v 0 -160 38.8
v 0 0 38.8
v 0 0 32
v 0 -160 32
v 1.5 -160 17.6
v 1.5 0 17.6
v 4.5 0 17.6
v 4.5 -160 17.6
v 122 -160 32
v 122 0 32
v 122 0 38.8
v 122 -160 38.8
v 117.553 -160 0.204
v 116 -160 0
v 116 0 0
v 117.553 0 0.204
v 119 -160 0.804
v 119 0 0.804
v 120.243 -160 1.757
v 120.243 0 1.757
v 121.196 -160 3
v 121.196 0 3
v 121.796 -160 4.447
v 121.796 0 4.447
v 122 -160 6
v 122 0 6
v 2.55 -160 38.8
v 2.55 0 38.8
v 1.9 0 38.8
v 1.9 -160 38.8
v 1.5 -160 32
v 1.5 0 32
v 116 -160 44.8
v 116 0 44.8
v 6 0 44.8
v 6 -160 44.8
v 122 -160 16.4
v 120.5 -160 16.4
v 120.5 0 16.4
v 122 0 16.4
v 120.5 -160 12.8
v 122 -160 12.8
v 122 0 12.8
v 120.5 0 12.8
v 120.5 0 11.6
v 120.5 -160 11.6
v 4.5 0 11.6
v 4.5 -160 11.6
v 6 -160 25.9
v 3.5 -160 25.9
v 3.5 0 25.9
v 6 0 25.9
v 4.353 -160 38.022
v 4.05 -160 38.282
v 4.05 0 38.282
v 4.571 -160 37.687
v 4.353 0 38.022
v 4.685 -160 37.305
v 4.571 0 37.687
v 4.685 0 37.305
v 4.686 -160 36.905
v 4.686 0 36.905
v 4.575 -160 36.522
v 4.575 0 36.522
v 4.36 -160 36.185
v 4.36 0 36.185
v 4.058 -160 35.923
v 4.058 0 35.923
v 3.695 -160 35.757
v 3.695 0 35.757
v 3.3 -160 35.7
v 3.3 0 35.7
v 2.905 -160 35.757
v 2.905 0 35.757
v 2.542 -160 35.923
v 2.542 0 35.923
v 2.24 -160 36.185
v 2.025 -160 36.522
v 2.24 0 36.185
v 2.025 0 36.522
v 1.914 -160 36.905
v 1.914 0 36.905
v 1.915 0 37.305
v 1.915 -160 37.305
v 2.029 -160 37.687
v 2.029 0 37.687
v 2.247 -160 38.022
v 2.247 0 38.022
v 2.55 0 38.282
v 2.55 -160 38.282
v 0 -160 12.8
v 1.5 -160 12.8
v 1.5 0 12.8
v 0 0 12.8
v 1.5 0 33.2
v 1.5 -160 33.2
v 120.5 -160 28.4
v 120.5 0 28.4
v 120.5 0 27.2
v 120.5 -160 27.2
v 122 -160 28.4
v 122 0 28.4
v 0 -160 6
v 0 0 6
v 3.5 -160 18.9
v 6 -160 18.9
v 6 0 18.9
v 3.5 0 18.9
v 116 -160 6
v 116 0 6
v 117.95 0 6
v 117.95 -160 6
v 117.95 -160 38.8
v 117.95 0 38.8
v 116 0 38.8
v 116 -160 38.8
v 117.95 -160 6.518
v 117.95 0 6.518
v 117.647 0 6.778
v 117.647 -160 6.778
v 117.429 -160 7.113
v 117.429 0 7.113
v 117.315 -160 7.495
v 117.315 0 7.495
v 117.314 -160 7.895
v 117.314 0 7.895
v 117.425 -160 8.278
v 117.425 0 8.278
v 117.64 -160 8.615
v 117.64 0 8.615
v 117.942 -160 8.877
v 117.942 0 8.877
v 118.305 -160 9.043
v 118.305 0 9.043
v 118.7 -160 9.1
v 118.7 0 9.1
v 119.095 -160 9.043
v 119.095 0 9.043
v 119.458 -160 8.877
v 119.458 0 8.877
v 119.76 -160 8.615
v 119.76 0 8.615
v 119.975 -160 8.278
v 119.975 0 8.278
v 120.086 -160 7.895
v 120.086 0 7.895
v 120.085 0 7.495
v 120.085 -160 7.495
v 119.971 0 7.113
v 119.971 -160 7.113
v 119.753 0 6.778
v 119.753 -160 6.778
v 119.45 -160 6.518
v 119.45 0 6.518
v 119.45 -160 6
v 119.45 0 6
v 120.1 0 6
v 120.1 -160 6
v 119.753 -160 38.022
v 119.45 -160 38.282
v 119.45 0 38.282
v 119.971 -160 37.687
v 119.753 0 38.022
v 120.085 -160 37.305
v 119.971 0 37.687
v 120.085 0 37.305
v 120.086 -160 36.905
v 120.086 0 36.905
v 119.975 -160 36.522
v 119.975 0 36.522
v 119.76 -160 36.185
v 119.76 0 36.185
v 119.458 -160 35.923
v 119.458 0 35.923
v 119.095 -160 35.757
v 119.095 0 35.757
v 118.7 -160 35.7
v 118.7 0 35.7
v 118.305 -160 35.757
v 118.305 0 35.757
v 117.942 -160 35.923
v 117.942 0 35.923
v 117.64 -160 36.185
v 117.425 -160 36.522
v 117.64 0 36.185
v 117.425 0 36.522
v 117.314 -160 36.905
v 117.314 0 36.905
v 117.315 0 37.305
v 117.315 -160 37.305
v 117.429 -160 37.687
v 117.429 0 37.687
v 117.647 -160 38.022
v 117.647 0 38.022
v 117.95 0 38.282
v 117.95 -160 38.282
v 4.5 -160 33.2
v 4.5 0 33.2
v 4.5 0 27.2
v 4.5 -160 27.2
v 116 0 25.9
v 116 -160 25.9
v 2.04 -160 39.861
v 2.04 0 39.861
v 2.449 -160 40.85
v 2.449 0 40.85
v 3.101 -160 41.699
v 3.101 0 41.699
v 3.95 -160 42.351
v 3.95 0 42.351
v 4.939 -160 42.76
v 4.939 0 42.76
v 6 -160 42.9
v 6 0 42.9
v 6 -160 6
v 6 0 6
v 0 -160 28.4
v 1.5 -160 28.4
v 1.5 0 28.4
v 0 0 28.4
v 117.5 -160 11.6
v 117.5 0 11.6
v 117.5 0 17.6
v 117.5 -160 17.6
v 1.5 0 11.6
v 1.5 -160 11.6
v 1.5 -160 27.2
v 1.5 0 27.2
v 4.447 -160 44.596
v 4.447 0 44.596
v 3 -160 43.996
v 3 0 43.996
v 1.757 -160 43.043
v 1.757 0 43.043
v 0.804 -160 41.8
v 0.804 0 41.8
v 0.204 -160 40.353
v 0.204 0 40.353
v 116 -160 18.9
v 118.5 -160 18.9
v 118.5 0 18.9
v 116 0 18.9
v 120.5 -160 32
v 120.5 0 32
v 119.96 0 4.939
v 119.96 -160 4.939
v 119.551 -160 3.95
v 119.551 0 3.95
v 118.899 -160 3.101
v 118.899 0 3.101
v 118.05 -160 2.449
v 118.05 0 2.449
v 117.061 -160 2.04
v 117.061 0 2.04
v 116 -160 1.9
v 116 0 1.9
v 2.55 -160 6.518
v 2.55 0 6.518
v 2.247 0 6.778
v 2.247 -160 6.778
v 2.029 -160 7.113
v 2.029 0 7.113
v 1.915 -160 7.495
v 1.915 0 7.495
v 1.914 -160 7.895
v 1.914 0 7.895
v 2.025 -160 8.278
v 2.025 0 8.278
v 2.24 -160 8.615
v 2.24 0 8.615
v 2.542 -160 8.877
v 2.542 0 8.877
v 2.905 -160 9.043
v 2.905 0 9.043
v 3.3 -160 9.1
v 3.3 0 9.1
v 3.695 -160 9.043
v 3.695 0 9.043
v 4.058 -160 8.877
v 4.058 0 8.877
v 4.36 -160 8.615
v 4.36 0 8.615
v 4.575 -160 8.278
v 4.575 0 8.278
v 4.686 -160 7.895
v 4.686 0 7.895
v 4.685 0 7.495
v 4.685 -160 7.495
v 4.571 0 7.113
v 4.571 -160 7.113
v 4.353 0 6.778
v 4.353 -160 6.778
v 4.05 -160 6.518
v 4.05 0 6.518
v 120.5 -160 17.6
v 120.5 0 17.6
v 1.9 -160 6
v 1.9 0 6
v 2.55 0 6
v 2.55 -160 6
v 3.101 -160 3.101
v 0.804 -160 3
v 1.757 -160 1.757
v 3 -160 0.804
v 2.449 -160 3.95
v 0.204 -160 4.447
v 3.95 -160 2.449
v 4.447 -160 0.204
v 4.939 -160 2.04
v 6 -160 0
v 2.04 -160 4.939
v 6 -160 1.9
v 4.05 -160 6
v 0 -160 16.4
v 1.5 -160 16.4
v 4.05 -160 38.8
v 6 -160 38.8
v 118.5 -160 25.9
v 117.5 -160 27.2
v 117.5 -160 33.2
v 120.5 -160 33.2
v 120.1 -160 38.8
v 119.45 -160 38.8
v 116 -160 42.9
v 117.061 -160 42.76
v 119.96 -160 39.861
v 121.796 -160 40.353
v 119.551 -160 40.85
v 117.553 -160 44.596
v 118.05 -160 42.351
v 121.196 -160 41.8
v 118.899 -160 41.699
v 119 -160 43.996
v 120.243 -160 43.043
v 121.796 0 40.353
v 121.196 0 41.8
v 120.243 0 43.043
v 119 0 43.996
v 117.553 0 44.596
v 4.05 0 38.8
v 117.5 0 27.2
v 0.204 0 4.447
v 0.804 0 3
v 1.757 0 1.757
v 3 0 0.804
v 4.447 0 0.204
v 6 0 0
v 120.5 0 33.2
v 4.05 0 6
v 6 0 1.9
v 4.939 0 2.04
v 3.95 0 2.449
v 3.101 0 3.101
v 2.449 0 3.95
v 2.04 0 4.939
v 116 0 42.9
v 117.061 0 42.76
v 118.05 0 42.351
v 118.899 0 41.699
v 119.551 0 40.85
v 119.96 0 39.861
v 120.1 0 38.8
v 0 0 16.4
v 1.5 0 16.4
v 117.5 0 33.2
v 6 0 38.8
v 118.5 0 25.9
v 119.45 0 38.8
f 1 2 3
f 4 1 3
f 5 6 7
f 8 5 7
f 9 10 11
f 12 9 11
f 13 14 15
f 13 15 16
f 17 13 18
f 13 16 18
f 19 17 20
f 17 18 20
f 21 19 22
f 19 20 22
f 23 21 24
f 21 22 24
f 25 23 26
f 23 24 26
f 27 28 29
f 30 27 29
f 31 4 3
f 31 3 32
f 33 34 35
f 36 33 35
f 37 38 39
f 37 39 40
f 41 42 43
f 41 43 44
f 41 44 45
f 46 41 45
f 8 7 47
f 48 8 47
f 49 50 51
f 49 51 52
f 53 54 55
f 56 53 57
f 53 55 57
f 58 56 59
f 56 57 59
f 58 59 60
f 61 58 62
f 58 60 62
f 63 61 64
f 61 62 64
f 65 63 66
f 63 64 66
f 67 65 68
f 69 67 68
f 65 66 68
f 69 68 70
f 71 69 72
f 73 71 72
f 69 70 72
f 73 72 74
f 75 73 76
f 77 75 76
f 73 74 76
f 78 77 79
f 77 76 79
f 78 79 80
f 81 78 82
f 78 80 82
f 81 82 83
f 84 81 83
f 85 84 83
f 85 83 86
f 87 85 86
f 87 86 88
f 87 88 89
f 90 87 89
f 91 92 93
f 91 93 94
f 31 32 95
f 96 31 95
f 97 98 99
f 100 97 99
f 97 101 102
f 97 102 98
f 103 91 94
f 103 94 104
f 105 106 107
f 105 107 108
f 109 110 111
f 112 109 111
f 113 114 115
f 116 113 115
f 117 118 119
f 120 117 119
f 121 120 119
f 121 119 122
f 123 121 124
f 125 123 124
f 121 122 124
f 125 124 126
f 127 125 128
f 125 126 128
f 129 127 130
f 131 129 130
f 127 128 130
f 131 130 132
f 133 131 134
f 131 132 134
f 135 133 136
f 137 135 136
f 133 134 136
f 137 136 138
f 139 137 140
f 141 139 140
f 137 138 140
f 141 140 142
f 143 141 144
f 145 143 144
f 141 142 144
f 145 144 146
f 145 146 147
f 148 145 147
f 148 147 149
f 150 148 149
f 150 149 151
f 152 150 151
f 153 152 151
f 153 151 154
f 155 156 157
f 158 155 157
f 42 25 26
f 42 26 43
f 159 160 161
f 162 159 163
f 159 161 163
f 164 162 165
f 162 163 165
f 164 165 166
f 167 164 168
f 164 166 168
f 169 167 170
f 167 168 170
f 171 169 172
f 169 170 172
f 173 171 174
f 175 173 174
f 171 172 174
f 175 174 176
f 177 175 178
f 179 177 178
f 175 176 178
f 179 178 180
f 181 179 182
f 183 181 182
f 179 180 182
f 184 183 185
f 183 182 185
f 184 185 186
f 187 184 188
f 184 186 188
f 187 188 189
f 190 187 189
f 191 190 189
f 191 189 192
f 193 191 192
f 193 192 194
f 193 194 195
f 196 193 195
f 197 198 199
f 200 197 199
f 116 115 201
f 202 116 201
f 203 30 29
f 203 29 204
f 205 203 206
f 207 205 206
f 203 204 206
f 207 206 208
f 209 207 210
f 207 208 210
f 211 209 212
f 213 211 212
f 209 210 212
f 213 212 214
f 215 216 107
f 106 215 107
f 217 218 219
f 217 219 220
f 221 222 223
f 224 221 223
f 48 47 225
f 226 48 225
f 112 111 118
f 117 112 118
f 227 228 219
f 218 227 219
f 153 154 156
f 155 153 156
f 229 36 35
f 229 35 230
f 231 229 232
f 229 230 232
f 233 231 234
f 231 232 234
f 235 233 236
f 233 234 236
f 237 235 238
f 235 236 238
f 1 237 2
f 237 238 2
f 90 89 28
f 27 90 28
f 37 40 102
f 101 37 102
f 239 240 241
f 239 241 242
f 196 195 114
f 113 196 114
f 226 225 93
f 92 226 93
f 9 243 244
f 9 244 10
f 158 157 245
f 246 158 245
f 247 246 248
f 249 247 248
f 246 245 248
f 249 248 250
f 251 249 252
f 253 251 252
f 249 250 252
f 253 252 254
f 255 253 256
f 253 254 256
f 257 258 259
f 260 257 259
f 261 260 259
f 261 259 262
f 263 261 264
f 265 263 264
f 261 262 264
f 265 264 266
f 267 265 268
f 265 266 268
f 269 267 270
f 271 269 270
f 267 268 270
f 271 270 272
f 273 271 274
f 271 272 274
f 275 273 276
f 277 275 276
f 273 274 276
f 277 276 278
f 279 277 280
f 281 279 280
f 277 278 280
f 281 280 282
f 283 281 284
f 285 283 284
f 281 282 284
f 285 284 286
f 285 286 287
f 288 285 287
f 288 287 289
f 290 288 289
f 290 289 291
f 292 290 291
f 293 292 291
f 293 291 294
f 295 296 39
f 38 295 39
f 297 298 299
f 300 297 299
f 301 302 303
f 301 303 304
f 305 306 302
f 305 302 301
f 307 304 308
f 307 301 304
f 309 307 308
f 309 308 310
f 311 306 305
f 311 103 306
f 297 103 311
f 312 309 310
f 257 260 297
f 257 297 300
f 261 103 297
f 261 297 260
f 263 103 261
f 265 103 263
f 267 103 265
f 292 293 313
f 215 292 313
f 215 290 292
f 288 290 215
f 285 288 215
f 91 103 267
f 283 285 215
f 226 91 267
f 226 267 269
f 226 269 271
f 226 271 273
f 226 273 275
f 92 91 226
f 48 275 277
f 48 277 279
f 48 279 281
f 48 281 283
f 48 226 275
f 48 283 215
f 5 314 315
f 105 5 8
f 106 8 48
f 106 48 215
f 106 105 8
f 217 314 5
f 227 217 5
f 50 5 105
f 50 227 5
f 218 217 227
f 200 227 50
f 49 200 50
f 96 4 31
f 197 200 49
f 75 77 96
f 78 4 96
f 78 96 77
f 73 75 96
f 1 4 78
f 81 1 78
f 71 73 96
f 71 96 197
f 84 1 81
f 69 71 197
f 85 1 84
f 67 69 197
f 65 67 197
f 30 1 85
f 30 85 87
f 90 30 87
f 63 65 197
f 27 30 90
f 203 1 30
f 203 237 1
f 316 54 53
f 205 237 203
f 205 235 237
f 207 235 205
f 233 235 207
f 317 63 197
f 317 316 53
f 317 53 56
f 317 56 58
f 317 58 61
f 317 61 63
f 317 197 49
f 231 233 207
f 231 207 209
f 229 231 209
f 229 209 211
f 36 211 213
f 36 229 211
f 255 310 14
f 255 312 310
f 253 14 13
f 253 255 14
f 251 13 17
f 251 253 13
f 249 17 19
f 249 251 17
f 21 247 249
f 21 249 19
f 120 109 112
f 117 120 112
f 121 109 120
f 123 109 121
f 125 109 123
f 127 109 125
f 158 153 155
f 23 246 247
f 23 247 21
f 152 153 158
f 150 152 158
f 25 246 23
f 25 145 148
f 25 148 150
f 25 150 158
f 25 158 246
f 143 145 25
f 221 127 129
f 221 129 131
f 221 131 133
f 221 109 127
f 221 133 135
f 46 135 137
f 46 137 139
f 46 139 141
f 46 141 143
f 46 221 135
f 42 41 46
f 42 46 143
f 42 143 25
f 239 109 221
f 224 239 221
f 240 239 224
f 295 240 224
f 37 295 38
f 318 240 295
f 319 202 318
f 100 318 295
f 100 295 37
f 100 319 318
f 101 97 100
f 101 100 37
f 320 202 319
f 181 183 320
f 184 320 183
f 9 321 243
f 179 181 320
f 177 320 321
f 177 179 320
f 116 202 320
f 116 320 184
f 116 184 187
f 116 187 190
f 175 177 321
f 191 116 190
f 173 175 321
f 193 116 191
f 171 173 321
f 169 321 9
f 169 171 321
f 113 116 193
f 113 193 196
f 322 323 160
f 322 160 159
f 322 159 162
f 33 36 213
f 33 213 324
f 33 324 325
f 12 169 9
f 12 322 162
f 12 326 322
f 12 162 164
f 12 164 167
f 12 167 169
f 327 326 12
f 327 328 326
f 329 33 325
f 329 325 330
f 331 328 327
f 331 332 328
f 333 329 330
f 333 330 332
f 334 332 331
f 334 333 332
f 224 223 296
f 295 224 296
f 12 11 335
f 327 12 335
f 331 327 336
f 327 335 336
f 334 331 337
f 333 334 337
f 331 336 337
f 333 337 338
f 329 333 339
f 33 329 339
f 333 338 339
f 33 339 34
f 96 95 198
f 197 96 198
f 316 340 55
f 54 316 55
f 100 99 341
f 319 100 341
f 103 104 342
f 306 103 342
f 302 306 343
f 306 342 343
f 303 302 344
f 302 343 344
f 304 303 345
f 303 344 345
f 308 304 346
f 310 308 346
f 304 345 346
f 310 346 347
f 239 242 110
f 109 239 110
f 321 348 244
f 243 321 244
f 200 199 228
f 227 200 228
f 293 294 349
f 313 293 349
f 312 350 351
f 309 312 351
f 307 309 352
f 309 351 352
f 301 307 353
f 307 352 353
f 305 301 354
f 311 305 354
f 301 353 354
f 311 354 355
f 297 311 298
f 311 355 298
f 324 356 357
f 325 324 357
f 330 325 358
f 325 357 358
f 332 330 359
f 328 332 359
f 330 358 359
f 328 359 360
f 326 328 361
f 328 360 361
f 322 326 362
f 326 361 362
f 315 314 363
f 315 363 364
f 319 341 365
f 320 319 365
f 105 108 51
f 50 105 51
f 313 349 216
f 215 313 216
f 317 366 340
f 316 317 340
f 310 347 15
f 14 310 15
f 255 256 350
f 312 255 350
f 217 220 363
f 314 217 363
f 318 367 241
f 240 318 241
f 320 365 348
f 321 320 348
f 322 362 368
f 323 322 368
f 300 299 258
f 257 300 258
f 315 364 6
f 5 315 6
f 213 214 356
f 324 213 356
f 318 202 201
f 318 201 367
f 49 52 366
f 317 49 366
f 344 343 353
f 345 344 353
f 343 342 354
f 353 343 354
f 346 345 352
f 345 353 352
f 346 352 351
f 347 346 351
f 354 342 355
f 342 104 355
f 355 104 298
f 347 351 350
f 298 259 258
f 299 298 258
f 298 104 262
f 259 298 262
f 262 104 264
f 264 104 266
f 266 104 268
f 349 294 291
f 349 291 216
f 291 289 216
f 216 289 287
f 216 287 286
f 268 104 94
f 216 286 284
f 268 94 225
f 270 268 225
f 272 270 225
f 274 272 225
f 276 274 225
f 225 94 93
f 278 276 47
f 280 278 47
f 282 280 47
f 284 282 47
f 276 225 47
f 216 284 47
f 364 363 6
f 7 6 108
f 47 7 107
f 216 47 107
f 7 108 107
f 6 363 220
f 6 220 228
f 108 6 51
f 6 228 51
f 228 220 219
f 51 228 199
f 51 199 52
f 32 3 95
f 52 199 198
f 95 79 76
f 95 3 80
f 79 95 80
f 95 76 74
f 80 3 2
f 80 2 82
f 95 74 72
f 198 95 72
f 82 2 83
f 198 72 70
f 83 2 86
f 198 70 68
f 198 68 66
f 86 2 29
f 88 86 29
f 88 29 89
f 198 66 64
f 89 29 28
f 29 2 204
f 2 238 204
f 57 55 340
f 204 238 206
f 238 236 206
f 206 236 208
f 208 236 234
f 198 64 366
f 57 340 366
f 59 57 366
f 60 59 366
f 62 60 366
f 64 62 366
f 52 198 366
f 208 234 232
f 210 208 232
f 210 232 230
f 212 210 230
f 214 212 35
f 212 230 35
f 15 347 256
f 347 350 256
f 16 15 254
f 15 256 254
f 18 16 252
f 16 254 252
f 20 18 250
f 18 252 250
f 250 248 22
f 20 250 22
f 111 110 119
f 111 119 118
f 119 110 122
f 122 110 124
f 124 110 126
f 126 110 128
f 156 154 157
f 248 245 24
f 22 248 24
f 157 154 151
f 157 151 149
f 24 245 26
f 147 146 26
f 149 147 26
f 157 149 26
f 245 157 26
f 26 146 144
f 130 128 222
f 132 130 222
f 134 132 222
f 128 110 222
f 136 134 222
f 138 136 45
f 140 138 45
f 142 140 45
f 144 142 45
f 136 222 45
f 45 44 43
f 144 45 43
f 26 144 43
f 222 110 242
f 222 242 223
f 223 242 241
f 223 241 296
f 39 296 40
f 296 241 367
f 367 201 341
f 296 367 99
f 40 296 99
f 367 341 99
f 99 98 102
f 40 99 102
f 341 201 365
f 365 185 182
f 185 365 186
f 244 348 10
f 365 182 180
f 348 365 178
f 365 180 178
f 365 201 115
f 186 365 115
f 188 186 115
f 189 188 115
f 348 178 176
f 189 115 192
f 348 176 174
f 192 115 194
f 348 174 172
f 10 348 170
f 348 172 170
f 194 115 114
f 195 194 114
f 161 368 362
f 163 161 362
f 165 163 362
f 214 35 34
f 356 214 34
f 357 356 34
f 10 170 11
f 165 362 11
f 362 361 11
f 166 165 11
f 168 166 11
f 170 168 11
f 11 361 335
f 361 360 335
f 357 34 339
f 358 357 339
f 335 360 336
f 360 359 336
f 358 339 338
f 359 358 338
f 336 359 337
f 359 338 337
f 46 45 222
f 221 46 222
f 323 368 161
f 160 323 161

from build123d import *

# Parameters (mm, degrees)
F1_DEPTH = 160


with BuildPart() as f1:
    # F0 (on Front) → F1 (new body)
    with BuildSketch(Plane.XZ):
        with BuildLine():
            ThreePointArc((0, 6), (1.757359, 1.757359), (6, 0))
            Line((6, 0), (61, 0))
            Line((61, 0), (116, 0))
            ThreePointArc((116, 0), (120.242641, 1.757359), (122, 6))
            Line((122, 6), (122, 12.8))
            Line((122, 12.8), (120.5, 12.8))
            Line((120.5, 12.8), (120.5, 11.6))
            Line((120.5, 11.6), (117.5, 11.6))
            Line((117.5, 11.6), (117.5, 17.6))
            Line((117.5, 17.6), (120.5, 17.6))
            Line((120.5, 17.6), (120.5, 16.4))
            Line((120.5, 16.4), (122, 16.4))
            Line((122, 16.4), (122, 22.4))
            Line((122, 22.4), (122, 28.4))
            Line((122, 28.4), (120.5, 28.4))
            Line((120.5, 28.4), (120.5, 27.2))
            Line((120.5, 27.2), (117.5, 27.2))
            Line((117.5, 27.2), (117.5, 33.2))
            Line((117.5, 33.2), (120.5, 33.2))
            Line((120.5, 33.2), (120.5, 32))
            Line((120.5, 32), (122, 32))
            Line((122, 32), (122, 38.8))
            ThreePointArc((122, 38.8), (120.242641, 43.042641), (116, 44.8))
            Line((116, 44.8), (61, 44.8))
            Line((61, 44.8), (6, 44.8))
            ThreePointArc((6, 44.8), (1.757359, 43.042641), (0, 38.8))
            Line((0, 38.8), (0, 32))
            Line((0, 32), (1.5, 32))
            Line((1.5, 32), (1.5, 33.2))
            Line((1.5, 33.2), (4.5, 33.2))
            Line((4.5, 33.2), (4.5, 27.2))
            Line((4.5, 27.2), (1.5, 27.2))
            Line((1.5, 27.2), (1.5, 28.4))
            Line((1.5, 28.4), (0, 28.4))
            Line((0, 28.4), (0, 22.4))
            Line((0, 22.4), (0, 16.4))
            Line((0, 16.4), (1.5, 16.4))
            Line((1.5, 16.4), (1.5, 17.6))
            Line((1.5, 17.6), (4.5, 17.6))
            Line((4.5, 17.6), (4.5, 11.6))
            Line((4.5, 11.6), (1.5, 11.6))
            Line((1.5, 11.6), (1.5, 12.8))
            Line((1.5, 12.8), (0, 12.8))
            Line((0, 12.8), (0, 6))
        make_face()
        with BuildLine():
            ThreePointArc((1.9, 38.8), (3.100862, 41.699138), (6, 42.9))
            Line((6, 42.9), (61, 42.9))
            Line((61, 42.9), (116, 42.9))
            ThreePointArc((116, 42.9), (118.899138, 41.699138), (120.1, 38.8))
            Line((120.1, 38.8), (119.45, 38.8))
            Line((119.45, 38.8), (119.45, 38.282159))
            ThreePointArc((119.45, 38.282159), (118.7, 35.7), (117.95, 38.282159))
            Line((117.95, 38.282159), (117.95, 38.8))
            Line((117.95, 38.8), (116, 38.8))
            Line((116, 38.8), (116, 25.9))
            Line((116, 25.9), (118.5, 25.9))
            Line((118.5, 25.9), (118.5, 22.4))
            Line((118.5, 22.4), (118.5, 18.9))
            Line((118.5, 18.9), (116, 18.9))
            Line((116, 18.9), (116, 6))
            Line((116, 6), (117.95, 6))
            Line((117.95, 6), (117.95, 6.517841))
            ThreePointArc((117.95, 6.517841), (118.7, 9.1), (119.45, 6.517841))
            Line((119.45, 6.517841), (119.45, 6))
            Line((119.45, 6), (120.1, 6))
            ThreePointArc((120.1, 6), (118.899138, 3.100862), (116, 1.9))
            Line((116, 1.9), (61, 1.9))
            Line((61, 1.9), (6, 1.9))
            ThreePointArc((6, 1.9), (3.100862, 3.100862), (1.9, 6))
            Line((1.9, 6), (2.55, 6))
            Line((2.55, 6), (2.55, 6.517841))
            ThreePointArc((2.55, 6.517841), (3.3, 9.1), (4.05, 6.517841))
            Line((4.05, 6.517841), (4.05, 6))
            Line((4.05, 6), (6, 6))
            Line((6, 6), (6, 18.9))
            Line((6, 18.9), (3.5, 18.9))
            Line((3.5, 18.9), (3.5, 22.4))
            Line((3.5, 22.4), (3.5, 25.9))
            Line((3.5, 25.9), (6, 25.9))
            Line((6, 25.9), (6, 38.8))
            Line((6, 38.8), (4.05, 38.8))
            Line((4.05, 38.8), (4.05, 38.282159))
            ThreePointArc((4.05, 38.282159), (3.3, 35.7), (2.55, 38.282159))
            Line((2.55, 38.282159), (2.55, 38.8))
            Line((2.55, 38.8), (1.9, 38.8))
        make_face(mode=Mode.SUBTRACT)
    extrude(amount=F1_DEPTH)


solid = f1.part
